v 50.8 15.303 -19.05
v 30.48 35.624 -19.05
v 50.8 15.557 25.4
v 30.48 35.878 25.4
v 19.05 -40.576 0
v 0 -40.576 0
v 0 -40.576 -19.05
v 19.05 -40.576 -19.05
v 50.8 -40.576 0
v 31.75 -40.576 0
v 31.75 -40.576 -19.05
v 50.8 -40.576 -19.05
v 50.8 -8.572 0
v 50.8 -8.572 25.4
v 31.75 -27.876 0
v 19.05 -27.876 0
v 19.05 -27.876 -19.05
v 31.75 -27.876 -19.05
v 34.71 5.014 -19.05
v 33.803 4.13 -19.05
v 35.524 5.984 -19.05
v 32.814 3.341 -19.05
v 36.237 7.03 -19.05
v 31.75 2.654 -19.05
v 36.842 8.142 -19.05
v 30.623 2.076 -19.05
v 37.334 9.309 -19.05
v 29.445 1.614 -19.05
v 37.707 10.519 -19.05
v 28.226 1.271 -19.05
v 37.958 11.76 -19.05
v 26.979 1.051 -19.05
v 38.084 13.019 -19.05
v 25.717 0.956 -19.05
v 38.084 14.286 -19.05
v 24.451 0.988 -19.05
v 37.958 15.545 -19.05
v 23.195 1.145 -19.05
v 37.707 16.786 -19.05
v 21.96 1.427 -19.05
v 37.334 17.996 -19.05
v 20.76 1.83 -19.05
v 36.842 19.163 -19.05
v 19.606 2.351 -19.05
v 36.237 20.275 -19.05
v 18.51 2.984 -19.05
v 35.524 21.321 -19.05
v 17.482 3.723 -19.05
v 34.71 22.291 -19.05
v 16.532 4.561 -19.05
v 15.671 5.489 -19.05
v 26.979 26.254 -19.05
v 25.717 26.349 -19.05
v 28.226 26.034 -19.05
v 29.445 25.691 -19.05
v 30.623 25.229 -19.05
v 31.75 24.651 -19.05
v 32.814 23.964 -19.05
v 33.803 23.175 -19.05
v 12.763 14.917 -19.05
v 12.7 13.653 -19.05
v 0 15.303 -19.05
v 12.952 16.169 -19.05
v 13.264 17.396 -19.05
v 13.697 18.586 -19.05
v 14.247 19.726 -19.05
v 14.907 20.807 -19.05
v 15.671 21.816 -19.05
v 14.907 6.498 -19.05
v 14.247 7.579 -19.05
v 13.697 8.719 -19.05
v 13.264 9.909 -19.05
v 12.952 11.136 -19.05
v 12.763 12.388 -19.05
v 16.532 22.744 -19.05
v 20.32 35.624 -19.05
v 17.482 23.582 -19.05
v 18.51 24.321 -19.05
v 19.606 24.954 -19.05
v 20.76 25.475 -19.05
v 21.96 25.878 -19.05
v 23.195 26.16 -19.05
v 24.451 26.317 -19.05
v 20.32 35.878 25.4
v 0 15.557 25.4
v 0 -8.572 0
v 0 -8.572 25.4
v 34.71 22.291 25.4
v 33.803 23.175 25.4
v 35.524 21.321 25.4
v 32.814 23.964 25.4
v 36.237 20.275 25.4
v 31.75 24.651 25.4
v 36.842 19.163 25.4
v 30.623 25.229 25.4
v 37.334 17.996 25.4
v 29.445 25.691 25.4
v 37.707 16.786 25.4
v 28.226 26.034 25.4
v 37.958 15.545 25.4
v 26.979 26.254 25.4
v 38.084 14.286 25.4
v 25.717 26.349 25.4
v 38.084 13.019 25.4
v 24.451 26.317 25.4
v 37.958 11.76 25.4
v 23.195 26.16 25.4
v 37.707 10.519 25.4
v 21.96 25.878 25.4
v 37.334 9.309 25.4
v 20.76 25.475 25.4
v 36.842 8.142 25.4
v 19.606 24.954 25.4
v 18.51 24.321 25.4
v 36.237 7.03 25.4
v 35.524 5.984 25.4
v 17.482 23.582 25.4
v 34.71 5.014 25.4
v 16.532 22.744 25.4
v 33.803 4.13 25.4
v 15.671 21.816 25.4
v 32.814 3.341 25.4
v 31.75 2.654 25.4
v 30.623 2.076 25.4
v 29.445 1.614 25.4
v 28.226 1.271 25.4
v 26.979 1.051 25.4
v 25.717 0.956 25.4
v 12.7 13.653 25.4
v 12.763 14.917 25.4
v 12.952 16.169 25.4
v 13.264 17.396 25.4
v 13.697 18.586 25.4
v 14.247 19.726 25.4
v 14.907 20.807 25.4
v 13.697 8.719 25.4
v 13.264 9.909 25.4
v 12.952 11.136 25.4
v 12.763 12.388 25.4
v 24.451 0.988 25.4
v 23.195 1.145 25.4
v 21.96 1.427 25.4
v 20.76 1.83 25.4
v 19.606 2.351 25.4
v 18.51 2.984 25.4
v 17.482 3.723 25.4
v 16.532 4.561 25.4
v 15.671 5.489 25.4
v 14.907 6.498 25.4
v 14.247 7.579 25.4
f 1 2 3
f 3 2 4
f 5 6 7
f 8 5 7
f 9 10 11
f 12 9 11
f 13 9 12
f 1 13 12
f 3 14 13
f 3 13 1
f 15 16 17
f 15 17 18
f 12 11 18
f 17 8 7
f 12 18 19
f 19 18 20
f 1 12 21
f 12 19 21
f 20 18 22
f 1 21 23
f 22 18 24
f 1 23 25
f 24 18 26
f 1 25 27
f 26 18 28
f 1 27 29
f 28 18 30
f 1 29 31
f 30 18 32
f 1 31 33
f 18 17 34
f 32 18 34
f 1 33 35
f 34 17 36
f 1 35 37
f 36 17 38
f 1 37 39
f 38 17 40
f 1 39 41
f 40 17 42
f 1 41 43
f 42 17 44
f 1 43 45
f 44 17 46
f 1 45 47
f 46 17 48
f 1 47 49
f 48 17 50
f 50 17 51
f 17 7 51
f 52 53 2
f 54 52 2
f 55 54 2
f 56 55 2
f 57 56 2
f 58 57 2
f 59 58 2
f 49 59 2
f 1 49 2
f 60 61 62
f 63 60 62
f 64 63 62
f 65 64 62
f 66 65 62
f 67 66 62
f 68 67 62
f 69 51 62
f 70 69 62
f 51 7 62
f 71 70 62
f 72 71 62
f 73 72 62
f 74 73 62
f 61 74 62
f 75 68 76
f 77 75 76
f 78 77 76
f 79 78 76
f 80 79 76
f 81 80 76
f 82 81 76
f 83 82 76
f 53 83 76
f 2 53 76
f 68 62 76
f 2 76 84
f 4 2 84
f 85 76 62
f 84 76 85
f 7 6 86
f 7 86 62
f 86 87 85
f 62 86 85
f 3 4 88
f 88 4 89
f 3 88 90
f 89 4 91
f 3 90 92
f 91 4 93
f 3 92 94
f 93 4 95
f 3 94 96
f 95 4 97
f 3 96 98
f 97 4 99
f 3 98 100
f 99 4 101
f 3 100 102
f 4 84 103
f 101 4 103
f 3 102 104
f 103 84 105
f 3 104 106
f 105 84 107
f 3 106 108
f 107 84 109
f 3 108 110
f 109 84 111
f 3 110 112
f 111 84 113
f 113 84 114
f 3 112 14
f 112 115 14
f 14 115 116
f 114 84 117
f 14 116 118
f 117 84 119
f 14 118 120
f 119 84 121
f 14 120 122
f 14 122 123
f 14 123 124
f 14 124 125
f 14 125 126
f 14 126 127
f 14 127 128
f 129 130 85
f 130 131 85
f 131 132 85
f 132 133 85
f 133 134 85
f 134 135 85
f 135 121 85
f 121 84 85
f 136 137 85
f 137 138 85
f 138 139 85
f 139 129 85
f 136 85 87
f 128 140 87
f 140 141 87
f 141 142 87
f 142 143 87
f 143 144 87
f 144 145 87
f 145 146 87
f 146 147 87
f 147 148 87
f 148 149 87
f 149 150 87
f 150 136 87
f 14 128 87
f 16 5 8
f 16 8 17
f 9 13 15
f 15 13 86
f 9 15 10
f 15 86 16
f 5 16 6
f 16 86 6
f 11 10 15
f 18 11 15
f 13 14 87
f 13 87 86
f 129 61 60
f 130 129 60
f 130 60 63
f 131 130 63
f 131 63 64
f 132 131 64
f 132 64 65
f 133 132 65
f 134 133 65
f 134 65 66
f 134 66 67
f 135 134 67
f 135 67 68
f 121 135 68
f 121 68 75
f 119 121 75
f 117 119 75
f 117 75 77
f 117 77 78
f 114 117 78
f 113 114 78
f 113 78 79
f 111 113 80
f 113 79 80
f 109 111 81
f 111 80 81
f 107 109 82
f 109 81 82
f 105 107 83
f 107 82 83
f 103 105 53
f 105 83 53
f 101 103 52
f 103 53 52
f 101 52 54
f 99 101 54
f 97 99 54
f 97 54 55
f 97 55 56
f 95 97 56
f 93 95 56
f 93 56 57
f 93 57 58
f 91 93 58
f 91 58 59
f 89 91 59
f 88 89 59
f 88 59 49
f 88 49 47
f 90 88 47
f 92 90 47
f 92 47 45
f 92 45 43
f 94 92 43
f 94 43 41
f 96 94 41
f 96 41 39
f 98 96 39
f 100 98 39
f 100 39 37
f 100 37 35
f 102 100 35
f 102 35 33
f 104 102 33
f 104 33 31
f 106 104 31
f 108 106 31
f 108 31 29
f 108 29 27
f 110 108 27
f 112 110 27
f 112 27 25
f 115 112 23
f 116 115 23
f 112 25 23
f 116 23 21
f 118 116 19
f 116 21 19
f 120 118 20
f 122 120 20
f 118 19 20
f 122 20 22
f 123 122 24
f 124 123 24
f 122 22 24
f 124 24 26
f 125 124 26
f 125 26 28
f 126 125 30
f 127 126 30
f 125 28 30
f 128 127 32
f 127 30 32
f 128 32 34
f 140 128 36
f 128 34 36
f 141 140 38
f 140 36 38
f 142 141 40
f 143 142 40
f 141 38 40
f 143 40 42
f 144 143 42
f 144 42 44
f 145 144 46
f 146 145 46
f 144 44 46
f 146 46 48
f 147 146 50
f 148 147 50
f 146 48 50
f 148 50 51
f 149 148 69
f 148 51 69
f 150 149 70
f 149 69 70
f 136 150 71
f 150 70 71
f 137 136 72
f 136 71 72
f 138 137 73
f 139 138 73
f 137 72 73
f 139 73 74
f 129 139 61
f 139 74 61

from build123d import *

# Parameters (mm, degrees)
F1_DEPTH = 50.8
F3_D     = 25.4
F4_SIZE  = 20.32
F5_W     = 12.7
F5_H     = 12.7
F6_DEPTH = 0.254
F7_DEPTH = 35.052


with BuildPart() as f1:
    # F0 (on Right) → F1 (new body)
    with BuildSketch(Plane.YZ):
        Polygon((-24.5744947175, 0), (-40.5764947175, 0), (-40.5764947175, -19.05), (35.6235052825, -19.05), (35.8775052825, 25.4), (-8.5724947175, 25.4), (-8.5724947175, 0), align=None)
    extrude(amount=F1_DEPTH)

    # F3 (through all)
    with Locations(Plane.XY.offset(25.4)):
        with Locations((25.4, 13.6525052825)):
            Hole(F3_D / 2)

    # F4
    f4_edges = [f1.edges().sort_by_distance(p)[0] for p in [
        (0, 35.750505, 3.175),
        (50.8, 35.750505, 3.175),
    ]]
    chamfer(f4_edges, length=F4_SIZE)

    # F5 (on face) → F6 (join)
    with BuildSketch(Plane.XY):
        with Locations((25.4, -34.2264947175)):
            Rectangle(F5_W, F5_H)
    extrude(amount=F6_DEPTH)

    # F7 (cut): a face of the model
    f7_faces = [f1.faces().sort_by_distance(p)[0] for p in [
        (25.4, -34.2264947175, 0.254),
    ]]
    extrude(f7_faces, amount=-F7_DEPTH, mode=Mode.SUBTRACT)


solid = f1.part
